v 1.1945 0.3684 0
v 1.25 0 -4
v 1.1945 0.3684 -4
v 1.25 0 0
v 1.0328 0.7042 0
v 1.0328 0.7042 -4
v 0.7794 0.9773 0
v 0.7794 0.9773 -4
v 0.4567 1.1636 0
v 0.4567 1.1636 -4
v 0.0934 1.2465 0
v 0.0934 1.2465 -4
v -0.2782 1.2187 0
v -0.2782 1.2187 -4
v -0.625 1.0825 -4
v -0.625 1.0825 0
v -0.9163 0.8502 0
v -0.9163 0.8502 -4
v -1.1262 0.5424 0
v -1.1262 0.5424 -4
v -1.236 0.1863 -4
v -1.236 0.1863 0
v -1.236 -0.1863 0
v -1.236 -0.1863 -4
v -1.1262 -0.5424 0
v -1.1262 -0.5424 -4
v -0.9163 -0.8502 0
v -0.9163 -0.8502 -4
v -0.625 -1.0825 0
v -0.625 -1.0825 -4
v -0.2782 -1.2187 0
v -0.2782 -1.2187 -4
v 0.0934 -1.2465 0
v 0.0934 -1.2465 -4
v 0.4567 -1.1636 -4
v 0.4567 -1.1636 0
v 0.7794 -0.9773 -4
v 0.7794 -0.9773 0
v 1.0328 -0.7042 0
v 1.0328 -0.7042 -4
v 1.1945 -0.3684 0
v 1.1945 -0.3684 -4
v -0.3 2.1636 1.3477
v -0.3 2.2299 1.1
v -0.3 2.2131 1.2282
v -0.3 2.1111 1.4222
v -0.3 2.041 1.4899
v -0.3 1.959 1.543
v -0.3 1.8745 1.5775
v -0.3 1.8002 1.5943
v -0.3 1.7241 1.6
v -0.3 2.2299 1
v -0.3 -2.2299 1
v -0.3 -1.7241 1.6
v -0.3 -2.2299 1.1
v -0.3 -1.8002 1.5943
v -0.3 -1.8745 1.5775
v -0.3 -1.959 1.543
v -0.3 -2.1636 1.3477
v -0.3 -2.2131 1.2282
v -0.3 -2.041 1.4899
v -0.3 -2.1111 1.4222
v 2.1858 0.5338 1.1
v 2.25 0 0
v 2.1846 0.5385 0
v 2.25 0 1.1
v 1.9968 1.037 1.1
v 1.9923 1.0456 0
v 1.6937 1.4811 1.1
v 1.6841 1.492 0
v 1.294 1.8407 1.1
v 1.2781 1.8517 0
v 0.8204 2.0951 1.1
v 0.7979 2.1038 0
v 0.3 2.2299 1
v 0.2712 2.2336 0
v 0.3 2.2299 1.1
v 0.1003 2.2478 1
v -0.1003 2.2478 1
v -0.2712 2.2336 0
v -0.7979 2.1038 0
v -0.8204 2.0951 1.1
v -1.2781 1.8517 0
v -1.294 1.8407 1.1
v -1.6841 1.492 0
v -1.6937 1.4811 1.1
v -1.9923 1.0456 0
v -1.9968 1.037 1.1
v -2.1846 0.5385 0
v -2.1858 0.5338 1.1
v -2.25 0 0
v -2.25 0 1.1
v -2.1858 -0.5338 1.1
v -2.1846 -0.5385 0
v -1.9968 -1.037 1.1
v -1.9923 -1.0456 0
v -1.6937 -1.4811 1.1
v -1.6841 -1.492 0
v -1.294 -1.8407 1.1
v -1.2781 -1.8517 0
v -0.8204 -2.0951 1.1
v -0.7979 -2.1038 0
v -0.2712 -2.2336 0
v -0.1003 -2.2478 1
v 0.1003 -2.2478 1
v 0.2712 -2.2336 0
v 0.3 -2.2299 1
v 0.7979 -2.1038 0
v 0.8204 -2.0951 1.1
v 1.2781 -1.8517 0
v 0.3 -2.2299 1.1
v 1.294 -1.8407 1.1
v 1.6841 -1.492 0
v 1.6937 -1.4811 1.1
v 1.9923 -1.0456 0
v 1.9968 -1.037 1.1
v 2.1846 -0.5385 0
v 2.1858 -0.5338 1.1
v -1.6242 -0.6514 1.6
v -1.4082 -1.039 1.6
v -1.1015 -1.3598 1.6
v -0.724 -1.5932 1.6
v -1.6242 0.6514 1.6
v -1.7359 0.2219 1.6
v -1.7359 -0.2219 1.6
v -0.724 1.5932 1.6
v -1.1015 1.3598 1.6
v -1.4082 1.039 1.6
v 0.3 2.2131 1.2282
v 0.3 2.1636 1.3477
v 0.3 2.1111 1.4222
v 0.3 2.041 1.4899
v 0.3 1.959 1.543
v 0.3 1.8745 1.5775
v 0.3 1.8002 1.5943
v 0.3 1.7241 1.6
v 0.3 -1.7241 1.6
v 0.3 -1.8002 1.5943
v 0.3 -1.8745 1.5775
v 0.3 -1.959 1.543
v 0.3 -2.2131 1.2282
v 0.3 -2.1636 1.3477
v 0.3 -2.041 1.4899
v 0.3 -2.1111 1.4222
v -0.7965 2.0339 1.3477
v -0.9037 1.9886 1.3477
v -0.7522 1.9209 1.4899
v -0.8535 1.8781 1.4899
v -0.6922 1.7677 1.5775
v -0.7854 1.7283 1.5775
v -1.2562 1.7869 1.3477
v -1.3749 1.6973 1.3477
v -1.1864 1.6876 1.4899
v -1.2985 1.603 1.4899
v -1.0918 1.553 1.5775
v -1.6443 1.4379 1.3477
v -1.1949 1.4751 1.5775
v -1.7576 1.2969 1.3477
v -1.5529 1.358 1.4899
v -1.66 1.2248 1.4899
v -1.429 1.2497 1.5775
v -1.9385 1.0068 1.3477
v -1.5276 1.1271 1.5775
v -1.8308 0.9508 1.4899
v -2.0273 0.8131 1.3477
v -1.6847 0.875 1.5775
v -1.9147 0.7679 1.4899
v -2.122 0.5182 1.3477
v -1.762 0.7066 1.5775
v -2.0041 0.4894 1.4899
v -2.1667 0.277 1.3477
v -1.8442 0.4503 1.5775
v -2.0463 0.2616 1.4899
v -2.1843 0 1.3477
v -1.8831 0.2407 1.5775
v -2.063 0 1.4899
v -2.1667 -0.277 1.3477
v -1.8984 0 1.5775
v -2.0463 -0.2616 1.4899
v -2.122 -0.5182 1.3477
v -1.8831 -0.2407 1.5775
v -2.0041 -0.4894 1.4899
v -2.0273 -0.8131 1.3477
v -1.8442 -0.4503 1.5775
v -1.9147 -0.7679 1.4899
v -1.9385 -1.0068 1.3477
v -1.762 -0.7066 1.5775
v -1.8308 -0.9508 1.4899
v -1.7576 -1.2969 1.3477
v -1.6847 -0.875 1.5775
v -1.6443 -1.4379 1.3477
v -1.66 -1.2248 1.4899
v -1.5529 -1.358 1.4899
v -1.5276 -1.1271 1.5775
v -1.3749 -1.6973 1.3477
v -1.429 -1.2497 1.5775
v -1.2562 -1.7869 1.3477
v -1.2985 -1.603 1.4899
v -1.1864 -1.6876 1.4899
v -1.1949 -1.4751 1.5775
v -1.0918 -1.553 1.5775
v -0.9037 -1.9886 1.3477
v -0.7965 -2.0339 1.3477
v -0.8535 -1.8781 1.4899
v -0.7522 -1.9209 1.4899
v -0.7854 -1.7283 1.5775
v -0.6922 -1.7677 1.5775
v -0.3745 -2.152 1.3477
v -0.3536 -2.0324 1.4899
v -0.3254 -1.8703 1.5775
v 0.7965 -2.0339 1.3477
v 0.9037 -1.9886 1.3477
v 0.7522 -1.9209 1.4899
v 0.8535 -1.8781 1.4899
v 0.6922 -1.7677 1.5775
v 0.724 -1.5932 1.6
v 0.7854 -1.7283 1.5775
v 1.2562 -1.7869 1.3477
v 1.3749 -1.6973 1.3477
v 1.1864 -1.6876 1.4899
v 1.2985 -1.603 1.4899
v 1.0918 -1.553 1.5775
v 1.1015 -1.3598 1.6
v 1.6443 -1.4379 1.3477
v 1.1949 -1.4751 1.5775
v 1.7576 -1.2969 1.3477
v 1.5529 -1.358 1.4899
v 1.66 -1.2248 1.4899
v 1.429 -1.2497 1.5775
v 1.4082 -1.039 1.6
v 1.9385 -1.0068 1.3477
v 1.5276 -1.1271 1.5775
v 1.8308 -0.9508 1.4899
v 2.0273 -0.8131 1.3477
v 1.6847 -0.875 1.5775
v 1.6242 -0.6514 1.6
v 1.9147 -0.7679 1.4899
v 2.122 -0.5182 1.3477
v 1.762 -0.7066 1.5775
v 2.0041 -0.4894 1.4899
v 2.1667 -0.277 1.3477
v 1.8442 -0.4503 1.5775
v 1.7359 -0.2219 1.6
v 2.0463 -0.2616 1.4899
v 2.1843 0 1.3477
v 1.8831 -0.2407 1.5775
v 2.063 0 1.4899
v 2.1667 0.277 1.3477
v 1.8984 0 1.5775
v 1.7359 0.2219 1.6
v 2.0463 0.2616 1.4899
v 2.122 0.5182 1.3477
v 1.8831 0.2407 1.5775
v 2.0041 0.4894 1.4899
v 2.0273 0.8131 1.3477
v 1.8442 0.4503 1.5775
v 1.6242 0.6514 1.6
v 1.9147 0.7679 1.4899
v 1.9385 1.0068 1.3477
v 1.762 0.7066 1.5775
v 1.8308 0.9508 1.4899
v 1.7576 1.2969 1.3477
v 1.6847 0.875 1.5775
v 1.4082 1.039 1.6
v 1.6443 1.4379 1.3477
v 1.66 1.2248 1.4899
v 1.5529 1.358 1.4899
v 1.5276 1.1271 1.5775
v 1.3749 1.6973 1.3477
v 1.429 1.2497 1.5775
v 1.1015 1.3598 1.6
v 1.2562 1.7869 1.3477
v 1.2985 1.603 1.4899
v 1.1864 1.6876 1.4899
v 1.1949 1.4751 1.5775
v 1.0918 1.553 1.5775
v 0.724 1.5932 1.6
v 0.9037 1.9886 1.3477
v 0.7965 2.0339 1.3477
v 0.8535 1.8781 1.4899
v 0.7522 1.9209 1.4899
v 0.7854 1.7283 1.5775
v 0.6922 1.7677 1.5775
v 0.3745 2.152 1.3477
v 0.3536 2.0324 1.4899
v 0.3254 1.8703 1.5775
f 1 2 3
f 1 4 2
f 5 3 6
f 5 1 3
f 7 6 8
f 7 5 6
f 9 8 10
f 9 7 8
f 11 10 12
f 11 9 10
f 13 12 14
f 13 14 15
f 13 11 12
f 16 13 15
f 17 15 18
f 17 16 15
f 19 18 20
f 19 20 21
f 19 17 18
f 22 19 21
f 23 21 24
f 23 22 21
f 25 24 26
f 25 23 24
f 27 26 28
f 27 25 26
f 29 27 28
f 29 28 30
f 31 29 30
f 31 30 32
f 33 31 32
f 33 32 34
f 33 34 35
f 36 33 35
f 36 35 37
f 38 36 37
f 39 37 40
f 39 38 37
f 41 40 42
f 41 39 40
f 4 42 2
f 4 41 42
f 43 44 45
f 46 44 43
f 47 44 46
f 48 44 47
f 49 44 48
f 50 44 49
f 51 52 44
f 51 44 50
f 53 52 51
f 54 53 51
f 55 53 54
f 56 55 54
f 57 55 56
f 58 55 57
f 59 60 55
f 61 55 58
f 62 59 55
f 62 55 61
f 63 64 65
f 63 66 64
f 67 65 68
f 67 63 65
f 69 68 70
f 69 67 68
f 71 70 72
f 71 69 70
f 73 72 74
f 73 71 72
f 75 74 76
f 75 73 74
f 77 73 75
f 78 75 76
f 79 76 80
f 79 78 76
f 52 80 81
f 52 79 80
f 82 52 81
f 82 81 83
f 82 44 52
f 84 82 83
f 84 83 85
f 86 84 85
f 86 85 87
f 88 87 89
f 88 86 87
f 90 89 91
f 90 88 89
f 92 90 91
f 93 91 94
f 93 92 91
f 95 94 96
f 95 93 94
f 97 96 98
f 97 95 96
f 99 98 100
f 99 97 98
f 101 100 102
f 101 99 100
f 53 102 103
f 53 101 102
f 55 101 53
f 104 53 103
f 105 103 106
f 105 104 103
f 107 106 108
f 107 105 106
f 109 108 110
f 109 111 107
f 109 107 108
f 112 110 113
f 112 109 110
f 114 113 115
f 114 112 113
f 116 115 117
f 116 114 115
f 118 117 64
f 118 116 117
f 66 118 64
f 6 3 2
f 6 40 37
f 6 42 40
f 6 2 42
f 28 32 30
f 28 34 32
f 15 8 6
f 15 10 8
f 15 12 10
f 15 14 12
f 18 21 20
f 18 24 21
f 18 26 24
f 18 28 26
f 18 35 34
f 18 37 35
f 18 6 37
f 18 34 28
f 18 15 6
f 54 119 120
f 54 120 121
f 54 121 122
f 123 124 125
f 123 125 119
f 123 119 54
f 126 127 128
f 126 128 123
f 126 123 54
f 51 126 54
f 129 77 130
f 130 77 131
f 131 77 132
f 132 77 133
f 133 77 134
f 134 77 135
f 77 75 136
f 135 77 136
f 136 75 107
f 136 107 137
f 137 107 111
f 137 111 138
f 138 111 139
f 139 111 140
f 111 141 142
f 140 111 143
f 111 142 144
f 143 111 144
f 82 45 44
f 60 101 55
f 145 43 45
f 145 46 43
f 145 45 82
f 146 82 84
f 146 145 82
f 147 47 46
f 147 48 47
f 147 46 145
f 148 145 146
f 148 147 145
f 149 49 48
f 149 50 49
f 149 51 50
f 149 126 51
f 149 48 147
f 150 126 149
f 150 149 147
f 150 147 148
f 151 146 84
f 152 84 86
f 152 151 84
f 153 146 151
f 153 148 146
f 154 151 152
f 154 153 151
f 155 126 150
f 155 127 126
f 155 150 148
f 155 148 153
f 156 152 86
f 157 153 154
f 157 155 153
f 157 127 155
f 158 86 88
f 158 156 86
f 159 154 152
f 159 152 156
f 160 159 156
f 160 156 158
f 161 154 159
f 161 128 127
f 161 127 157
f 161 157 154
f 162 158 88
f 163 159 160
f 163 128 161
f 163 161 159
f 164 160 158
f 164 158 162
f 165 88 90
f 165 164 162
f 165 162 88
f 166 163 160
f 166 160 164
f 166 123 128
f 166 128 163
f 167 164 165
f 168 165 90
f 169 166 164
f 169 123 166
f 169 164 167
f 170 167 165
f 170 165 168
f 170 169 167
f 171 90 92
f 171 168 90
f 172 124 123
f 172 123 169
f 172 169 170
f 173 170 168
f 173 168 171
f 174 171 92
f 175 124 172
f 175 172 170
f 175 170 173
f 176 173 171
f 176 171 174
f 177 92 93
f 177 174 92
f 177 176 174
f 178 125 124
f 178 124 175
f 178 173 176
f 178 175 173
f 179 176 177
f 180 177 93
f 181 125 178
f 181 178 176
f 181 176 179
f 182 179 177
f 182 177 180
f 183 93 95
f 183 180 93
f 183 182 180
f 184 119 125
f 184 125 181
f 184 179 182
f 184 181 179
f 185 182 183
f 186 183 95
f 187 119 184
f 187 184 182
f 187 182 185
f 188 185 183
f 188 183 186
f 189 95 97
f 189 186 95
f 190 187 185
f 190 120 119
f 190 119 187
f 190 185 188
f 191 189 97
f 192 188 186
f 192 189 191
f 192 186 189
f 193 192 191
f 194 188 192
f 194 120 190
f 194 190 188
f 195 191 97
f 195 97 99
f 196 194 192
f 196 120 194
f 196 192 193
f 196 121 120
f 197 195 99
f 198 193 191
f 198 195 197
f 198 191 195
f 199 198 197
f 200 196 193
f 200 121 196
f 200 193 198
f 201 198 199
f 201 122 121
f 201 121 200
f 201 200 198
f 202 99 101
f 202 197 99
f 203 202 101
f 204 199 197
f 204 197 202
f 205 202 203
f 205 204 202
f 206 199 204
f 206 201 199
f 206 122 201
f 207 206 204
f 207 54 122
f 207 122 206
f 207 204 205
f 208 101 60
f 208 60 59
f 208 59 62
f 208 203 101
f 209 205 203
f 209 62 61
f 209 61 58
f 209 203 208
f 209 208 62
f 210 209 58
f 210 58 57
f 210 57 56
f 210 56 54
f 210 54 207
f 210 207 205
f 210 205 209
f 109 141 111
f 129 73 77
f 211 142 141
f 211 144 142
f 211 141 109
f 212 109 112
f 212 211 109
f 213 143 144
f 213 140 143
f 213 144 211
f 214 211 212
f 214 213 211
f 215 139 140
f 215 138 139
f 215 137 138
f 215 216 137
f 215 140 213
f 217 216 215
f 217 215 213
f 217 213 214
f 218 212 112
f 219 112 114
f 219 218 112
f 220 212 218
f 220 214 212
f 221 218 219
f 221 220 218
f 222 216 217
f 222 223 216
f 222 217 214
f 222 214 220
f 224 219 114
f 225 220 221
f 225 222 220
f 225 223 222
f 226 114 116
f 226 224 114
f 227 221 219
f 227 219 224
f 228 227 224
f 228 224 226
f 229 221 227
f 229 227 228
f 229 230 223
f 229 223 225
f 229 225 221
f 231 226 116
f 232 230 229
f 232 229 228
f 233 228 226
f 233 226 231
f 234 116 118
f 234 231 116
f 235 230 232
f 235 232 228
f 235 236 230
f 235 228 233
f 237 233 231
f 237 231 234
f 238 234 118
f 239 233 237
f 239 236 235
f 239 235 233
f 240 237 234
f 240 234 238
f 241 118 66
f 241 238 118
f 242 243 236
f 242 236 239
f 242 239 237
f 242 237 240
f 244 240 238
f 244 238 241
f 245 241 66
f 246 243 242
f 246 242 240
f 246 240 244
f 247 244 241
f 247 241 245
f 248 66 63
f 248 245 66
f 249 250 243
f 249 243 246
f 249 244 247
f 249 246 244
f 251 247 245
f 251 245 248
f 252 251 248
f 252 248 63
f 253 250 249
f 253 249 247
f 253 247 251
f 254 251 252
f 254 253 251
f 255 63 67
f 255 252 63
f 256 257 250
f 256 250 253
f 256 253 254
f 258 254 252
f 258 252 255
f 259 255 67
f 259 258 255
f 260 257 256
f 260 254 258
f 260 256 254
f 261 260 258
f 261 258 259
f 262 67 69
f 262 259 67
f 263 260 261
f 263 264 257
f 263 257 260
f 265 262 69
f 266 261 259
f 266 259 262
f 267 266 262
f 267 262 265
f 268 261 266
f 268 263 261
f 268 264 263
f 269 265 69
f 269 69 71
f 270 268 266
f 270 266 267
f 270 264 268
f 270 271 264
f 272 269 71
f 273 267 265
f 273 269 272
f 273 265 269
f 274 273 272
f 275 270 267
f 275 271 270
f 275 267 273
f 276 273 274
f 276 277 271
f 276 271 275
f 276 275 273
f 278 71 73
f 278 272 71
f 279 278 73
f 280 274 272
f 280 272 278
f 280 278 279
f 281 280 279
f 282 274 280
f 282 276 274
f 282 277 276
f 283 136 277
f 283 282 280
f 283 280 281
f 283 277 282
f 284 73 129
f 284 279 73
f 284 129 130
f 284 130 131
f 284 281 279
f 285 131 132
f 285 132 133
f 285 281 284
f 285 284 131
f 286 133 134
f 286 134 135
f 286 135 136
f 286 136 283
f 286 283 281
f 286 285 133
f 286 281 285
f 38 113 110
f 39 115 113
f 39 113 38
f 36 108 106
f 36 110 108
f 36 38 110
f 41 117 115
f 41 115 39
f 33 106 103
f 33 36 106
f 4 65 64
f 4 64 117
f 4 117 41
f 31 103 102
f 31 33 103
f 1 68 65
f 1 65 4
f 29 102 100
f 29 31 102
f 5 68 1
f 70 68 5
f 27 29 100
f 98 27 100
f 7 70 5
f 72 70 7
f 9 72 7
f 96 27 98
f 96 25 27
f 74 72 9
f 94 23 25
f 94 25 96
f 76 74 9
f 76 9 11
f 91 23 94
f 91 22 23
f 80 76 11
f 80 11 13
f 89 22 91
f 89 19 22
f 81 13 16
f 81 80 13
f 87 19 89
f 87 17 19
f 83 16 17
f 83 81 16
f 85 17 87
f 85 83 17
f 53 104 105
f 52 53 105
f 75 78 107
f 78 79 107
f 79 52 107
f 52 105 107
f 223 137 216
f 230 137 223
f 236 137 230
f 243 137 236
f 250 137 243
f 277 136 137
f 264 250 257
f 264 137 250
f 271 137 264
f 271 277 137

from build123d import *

# Parameters (mm, degrees)
F2_W          = 0.6
F2_H          = 0.6
F3_DEPTH      = 2.251
F3_DEPTH_BACK = 2.251


with BuildPart() as f1:
    # F0 (on Front) → F1 (revolve)
    with BuildSketch(Plane.XZ):
        with BuildLine():
            Line((1.75, 1.6), (0, 1.6))
            Line((0, 1.6), (0, -4))
            Line((0, -4), (1.25, -4))
            Line((1.25, -4), (1.25, 0))
            Line((1.25, 0), (2.25, 0))
            Line((2.25, 0), (2.25, 1.1))
            ThreePointArc((2.25, 1.1), (2.1035533906, 1.4535533906), (1.75, 1.6))
        make_face()
    revolve(axis=Axis((0, 0, 1.6484611327), (0, 0, 1)))

    # F2 (on Front) → F3 (cut, two sides)
    with BuildSketch(Plane.XZ) as f3_sk:
        with Locations((0, 1.3)):
            Rectangle(F2_W, F2_H)
    extrude(amount=-F3_DEPTH, mode=Mode.SUBTRACT)
    extrude(f3_sk.sketch, amount=F3_DEPTH_BACK, mode=Mode.SUBTRACT)


solid = f1.part
